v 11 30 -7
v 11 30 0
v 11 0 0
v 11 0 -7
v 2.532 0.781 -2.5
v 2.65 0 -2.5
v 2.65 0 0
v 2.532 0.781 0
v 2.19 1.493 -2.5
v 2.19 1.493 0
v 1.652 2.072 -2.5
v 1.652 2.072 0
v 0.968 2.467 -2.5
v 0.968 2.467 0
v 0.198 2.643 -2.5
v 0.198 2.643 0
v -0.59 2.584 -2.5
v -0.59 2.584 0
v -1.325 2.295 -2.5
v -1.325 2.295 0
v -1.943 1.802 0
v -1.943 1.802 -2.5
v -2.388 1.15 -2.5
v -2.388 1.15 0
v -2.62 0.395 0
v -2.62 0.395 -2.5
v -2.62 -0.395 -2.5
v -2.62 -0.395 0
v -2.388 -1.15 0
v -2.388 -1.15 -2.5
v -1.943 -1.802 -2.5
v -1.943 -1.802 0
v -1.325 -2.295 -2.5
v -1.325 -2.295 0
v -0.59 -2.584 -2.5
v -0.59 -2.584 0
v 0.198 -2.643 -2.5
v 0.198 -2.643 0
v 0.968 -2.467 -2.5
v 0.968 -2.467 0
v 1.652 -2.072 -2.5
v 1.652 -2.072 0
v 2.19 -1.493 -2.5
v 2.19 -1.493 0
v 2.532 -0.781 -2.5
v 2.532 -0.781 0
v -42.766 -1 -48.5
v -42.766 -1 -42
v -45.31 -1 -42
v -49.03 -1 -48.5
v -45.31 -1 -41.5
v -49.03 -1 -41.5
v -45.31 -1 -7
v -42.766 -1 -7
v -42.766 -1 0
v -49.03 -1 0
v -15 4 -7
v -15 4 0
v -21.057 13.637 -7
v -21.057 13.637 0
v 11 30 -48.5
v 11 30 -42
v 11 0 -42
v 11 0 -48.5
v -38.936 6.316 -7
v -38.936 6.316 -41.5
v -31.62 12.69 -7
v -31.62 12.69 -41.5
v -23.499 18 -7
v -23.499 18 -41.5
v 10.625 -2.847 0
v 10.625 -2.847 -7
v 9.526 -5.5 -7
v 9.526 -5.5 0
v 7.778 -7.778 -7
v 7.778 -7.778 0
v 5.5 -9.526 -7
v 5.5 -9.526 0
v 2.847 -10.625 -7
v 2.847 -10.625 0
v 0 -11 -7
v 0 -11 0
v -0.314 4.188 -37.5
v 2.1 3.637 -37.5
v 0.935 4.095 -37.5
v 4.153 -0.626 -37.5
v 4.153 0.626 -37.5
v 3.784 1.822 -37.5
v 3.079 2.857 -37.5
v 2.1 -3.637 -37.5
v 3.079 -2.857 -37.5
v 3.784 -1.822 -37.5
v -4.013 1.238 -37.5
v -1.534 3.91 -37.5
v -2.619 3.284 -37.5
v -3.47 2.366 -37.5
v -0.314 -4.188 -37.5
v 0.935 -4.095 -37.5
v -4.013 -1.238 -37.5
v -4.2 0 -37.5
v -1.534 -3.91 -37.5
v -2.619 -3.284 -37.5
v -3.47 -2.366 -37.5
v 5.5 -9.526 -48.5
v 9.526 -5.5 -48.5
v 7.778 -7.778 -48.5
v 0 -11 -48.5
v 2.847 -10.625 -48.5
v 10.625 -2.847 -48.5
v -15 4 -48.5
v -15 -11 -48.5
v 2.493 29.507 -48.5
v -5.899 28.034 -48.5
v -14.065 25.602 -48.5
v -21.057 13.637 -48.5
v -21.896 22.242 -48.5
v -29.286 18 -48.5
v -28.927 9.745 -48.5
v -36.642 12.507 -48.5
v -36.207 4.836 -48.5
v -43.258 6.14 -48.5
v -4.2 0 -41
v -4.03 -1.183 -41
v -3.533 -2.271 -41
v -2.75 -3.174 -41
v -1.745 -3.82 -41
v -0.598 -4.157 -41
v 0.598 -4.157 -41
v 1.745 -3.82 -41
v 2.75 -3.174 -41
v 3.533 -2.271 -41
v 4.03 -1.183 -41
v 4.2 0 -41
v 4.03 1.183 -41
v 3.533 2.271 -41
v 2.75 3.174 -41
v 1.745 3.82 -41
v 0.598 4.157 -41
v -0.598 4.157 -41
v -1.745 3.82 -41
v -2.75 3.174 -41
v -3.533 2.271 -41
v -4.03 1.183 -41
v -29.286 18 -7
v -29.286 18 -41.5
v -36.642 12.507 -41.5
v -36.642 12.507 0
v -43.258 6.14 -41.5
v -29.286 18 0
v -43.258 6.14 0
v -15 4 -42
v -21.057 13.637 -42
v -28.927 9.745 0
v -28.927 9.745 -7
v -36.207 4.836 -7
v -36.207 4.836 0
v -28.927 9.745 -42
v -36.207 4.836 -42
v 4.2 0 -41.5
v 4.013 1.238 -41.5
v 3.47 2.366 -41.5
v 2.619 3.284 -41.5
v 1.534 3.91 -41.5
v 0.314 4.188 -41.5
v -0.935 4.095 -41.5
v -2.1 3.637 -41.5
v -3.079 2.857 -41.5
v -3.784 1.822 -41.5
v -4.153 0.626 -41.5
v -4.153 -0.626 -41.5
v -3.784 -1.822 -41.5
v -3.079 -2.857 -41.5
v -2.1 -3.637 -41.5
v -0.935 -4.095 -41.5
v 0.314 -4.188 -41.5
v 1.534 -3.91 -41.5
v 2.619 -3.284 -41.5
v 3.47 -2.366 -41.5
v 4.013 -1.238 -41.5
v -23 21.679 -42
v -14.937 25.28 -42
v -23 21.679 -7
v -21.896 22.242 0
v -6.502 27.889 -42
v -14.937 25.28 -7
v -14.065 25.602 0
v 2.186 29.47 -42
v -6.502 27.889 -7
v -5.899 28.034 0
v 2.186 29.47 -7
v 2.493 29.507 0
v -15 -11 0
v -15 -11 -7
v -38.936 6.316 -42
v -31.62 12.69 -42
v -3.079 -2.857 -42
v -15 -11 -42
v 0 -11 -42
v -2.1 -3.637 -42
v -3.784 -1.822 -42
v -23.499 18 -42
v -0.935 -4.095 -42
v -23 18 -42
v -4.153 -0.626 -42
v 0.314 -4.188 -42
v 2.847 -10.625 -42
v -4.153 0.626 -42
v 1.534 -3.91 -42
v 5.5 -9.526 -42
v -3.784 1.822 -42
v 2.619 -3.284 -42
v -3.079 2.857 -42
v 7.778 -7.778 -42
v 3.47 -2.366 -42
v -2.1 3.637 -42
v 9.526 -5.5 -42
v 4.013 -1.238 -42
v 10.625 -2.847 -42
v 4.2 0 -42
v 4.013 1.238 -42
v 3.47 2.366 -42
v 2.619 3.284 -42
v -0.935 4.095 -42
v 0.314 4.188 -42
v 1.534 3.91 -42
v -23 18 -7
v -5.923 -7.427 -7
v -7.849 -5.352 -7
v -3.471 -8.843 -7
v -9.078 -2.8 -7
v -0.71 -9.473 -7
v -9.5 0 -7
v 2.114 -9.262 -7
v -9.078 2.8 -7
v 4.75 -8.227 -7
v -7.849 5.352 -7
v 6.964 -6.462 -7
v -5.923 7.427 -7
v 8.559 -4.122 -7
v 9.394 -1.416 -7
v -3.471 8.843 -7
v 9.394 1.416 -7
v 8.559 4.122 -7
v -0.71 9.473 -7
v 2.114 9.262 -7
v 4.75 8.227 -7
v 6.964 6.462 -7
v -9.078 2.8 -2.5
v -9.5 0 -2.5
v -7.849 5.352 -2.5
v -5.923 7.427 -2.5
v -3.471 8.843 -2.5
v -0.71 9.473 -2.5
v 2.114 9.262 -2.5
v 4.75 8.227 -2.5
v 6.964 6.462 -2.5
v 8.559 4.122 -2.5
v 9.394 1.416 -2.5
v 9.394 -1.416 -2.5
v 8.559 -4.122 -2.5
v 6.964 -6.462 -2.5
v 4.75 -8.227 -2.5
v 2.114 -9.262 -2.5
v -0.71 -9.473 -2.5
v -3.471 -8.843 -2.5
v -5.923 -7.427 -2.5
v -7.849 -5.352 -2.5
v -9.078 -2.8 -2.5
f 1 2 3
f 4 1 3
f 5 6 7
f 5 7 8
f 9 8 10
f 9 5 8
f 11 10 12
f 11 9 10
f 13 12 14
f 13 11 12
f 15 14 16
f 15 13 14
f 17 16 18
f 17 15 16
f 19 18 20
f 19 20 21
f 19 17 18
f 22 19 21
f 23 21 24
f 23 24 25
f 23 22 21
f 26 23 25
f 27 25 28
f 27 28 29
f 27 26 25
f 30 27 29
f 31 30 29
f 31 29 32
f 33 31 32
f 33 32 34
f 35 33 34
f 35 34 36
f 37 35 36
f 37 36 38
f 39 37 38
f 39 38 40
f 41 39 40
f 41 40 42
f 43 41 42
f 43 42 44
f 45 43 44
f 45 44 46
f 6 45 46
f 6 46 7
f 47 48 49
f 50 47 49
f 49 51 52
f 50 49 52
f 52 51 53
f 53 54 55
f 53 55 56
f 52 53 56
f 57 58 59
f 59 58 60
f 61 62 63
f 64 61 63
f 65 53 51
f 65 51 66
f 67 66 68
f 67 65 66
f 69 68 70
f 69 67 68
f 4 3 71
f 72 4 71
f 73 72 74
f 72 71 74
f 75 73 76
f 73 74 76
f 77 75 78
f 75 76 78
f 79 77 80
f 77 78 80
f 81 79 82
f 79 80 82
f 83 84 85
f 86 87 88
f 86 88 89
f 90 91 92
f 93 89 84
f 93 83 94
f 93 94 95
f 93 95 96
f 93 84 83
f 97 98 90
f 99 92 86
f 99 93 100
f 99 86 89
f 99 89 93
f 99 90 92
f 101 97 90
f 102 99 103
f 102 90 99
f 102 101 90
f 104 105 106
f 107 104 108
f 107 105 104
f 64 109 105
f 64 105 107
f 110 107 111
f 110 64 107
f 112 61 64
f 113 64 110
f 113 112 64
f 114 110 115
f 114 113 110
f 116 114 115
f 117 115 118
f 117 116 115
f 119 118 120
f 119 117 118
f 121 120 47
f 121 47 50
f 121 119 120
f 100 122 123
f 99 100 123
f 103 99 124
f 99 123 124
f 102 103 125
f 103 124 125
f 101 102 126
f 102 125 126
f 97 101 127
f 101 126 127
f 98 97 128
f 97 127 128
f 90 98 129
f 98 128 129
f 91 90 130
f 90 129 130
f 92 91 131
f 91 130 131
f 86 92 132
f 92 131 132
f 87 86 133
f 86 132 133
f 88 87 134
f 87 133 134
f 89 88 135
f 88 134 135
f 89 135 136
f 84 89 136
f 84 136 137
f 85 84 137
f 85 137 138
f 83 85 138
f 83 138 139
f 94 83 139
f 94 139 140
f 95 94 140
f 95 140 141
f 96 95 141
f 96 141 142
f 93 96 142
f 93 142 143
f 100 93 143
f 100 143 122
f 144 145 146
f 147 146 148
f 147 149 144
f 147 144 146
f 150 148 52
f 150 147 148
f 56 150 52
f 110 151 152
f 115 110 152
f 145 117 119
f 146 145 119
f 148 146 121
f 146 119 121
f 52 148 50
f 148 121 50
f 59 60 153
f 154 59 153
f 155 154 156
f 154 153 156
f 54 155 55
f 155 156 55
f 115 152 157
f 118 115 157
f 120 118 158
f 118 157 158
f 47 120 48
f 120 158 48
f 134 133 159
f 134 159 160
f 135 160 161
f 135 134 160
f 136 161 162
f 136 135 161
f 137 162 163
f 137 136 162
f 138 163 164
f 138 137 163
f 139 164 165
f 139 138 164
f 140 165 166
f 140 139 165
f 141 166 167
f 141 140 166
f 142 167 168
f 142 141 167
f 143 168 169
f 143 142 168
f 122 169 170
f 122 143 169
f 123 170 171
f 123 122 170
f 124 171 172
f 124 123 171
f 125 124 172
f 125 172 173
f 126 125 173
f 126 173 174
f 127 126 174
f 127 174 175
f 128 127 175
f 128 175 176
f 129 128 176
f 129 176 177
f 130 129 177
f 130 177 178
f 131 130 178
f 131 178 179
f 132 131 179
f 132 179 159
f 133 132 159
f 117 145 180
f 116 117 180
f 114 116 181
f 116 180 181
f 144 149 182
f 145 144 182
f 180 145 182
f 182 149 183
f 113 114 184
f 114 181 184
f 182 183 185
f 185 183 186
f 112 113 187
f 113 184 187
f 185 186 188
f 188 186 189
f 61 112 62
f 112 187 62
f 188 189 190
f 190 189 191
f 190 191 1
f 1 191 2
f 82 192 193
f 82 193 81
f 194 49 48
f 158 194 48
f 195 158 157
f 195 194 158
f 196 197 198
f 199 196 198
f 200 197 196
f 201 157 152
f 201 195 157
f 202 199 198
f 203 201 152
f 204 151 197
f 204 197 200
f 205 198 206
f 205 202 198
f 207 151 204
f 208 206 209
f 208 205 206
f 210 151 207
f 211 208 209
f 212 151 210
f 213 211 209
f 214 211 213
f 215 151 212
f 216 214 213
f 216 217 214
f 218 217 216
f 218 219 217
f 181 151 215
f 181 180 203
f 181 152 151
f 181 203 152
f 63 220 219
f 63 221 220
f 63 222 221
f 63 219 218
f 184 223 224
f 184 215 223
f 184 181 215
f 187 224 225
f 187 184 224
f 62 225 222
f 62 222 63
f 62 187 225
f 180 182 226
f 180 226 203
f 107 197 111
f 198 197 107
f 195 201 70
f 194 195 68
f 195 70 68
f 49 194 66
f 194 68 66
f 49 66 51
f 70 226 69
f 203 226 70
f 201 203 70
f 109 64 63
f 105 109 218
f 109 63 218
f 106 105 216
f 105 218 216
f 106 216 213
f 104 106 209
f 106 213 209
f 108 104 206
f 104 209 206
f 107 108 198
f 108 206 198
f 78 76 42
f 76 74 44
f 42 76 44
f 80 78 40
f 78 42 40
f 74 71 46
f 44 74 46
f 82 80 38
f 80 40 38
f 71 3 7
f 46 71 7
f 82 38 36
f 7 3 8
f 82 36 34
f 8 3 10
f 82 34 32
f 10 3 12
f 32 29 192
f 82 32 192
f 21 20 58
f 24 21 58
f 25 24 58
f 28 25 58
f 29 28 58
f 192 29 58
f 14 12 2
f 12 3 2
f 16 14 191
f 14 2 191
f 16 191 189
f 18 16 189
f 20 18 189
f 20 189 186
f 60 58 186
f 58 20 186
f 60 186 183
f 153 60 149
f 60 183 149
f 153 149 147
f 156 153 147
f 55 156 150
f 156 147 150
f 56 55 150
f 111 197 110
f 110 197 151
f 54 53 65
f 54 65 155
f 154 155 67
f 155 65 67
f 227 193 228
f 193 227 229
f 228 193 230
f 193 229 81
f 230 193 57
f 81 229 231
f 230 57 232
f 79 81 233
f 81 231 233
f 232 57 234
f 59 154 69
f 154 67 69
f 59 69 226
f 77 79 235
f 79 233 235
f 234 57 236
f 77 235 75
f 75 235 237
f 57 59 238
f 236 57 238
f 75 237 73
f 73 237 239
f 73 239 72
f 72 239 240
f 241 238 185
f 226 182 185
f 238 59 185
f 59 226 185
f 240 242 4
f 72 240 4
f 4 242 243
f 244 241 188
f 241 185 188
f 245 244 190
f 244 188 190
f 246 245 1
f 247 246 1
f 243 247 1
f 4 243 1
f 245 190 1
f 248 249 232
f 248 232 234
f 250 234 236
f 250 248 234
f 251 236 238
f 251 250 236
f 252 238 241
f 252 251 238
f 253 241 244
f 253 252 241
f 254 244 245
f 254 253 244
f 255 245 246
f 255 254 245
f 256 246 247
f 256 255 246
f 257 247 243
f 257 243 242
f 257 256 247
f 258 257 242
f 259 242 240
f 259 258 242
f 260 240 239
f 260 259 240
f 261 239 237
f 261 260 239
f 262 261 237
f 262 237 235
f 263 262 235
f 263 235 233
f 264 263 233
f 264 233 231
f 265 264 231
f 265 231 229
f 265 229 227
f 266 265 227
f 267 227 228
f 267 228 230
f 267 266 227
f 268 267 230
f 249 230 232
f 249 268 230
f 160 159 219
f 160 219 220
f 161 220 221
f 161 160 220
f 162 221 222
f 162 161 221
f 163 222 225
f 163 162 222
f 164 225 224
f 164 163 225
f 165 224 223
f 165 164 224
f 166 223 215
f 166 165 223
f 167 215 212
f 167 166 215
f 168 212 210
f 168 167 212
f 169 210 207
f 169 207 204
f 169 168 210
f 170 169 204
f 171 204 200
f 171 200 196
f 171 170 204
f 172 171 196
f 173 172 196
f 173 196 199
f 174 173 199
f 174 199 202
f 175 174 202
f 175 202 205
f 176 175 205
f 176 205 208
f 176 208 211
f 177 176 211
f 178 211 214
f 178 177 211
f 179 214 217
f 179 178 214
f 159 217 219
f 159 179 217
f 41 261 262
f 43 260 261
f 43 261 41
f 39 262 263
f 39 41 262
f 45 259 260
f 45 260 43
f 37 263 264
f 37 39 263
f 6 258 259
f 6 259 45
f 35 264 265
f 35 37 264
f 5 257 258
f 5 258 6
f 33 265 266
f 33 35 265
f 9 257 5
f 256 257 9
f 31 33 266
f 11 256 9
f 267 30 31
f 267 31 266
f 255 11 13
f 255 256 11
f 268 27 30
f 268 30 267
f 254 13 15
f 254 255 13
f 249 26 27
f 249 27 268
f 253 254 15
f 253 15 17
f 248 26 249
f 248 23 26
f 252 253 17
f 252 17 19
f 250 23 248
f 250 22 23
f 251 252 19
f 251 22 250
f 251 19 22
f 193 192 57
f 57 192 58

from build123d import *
from build123d.topology import SkipClean

# Parameters (mm, degrees)
SKETCH1_R                = 9.5
BOSS_EXTRUDE1_DEPTH      = 48
SKETCH2_W                = 34
SKETCH2_H                = 30
CUT_EXTRUDE1_DEPTH       = 62.481704596
BOSS_EXTRUDE2_START      = -2.5
SKETCH3_R                = 9.5
SKETCH3_R_2              = 2.4
BOSS_EXTRUDE2_DEPTH      = 2.5
SKETCH4_R                = 9.5
SKETCH4_R_2              = 4.2
BOSS_EXTRUDE3_DEPTH      = 7
SKETCH5_R                = 4.2
BOSS_EXTRUDE4_DEPTH      = 11
BOSS_EXTRUDE5_DEPTH      = 48
CUT_EXTRUDE2_START       = -48
CUT_EXTRUDE2_OUTLINE_R   = 2.65
CUT_EXTRUDE2_DEPTH       = 48
CUT_EXTRUDE3_START       = -4.5
SKETCH8_R                = 9.5
CUT_EXTRUDE3_DEPTH       = 4.5
SKETCH9_R                = 6.067807638
CUT_EXTRUDE4_DEPTH       = 4.5
SKETCH10_R               = 9.5
BOSS_EXTRUDE6_DEPTH      = 4.5
SKETCH11_R               = 4.2
BOSS_EXTRUDE7_DEPTH      = 3.5
SKETCH12_R               = 2.4
BOSS_EXTRUDE8_DEPTH      = 2.5
SKETCH13_W               = 35
SKETCH13_H               = 34
CUT_EXTRUDE5_DEPTH       = 14.5
SKETCH15_R               = 3.436413098
BOSS_EXTRUDE9_DEPTH      = 10
BOSS_EXTRUDE10_DEPTH     = 0.5
SKETCH18_R               = 4.2
CUT_EXTRUDE8_DEPTH       = 0.5
CUT_EXTRUDE9_DEPTH       = 69.529190861
BOSS_EXTRUDE11_DEPTH     = 7
CUT_EXTRUDE10_DEPTH      = 80.22909819
BOSS_EXTRUDE12_DEPTH     = 41.5
SKETCH25_R               = 4.2
CUT_EXTRUDE11_DEPTH      = 0.5
CUT_EXTRUDE12_DEPTH      = 80.22909819
CUT_EXTRUDE12_DEPTH_BACK = 80.22909819


# Read off the part's stored shape, not the designer's step: Cut-Extrude2
with BuildPart() as part:
    # Sketch1 → Boss-Extrude1 (new body)
    with BuildSketch(Plane.XY):
        with BuildLine():
            Line((-12, 0), (-12, 30))
            Line((-12, 30), (12, 30))
            Line((12, 30), (12, 0))
            ThreePointArc((12, 0), (0, -12), (-12, 0))
        make_face()
        Circle(SKETCH1_R, mode=Mode.SUBTRACT)
    extrude(amount=-BOSS_EXTRUDE1_DEPTH)

    # Sketch2 → Cut-Extrude1 (cut, through all)
    with BuildSketch(Plane.ZY.offset(12)):
        with Locations((-24, 3)):
            Rectangle(SKETCH2_W, SKETCH2_H)
    extrude(amount=-CUT_EXTRUDE1_DEPTH, mode=Mode.SUBTRACT)

    # Sketch3 → Boss-Extrude2 (add)
    with BuildSketch(Plane(origin=(0, 0, -48), x_dir=(-1, 0, 0), z_dir=(0, 0, -1)).offset(BOSS_EXTRUDE2_START)):
        Circle(SKETCH3_R)
        Circle(SKETCH3_R_2, mode=Mode.SUBTRACT)
    extrude(amount=BOSS_EXTRUDE2_DEPTH)

    # Sketch4 → Boss-Extrude3 (add)
    with BuildSketch(Plane.XY):
        with Locations(Location((0, 0, 0), (0, 0, 180))):
            Circle(SKETCH4_R)
        Circle(SKETCH4_R_2, mode=Mode.SUBTRACT)
    extrude(amount=-BOSS_EXTRUDE3_DEPTH)

    # Sketch5 → Boss-Extrude4 (add)
    with BuildSketch(Plane.XY):
        Circle(SKETCH5_R)
    extrude(amount=-BOSS_EXTRUDE4_DEPTH)

    # Sketch6 → Boss-Extrude5 (add)
    with BuildSketch(Plane(origin=(0, 0, -48), x_dir=(-1, 0, 0), z_dir=(0, 0, -1))):
        Polygon((12, 30), (12, 18), (18, 18), (38, 18), (38, 30), align=None)
    extrude(amount=-BOSS_EXTRUDE5_DEPTH)

    # Cut-Extrude2 outline → Cut-Extrude2 (cut)
    with BuildSketch(Plane.XY.offset(CUT_EXTRUDE2_START)):
        Circle(CUT_EXTRUDE2_OUTLINE_R)
    extrude(amount=CUT_EXTRUDE2_DEPTH, mode=Mode.SUBTRACT)

    # Sketch8 → Cut-Extrude3 (cut)
    with BuildSketch(Plane(origin=(0, 0, -7), x_dir=(-1, 0, 0), z_dir=(0, 0, -1)).offset(CUT_EXTRUDE3_START)):
        Circle(SKETCH8_R)
    extrude(amount=CUT_EXTRUDE3_DEPTH, mode=Mode.SUBTRACT)


with BuildPart() as cut_extrude3_piece_1:
    # of the separate pieces the step leaves, piece 1, a body of its own (cut_extrude3_pieces)
    add(part.part.solids().sort_by_distance((-12, 0, 0))[0])

    # Sketch10 → Boss-Extrude6 (add)
    with BuildSketch(Plane.XY.offset(-45.5)):
        with Locations(Location((0, 0, 0), (0, 0, 90))):
            Circle(SKETCH10_R)
    extrude(amount=BOSS_EXTRUDE6_DEPTH)

    # Sketch11 → Boss-Extrude7 (add)
    with BuildSketch(Plane.XY.offset(-41)):
        with Locations(Location((0, 0, 0), (0, 0, 180))):
            Circle(SKETCH11_R)
    extrude(amount=BOSS_EXTRUDE7_DEPTH)

    # Sketch12 → Boss-Extrude8 (add)
    with BuildSketch(Plane(origin=(0, 0, -48), x_dir=(-1, 0, 0), z_dir=(0, 0, -1))):
        Circle(SKETCH12_R)
    extrude(amount=-BOSS_EXTRUDE8_DEPTH)

    # Sketch13 → Cut-Extrude5 (cut)
    with BuildSketch(Plane(origin=(0, 30, 0), x_dir=(1, 0, 0), z_dir=(0, 1, 0))):
        with Locations((-5.5, 24)):
            Rectangle(SKETCH13_W, SKETCH13_H)
    extrude(amount=-CUT_EXTRUDE5_DEPTH, mode=Mode.SUBTRACT)

    # Sketch15 → Boss-Extrude9 (add)
    with BuildSketch(Plane(origin=(0, 0, -48), x_dir=(-1, 0, 0), z_dir=(0, 0, -1))):
        Circle(SKETCH15_R)
    extrude(amount=-BOSS_EXTRUDE9_DEPTH)

    # Sketch16 → Boss-Extrude10 (add)
    with SkipClean():  # the faces are left unmerged after this step: merging them gives an invalid solid
        with BuildSketch(Plane(origin=(0, 0, -48), x_dir=(-1, 0, 0), z_dir=(0, 0, -1))):
            Polygon((38, 30), (-12, 30), (-12, 18), (12, 18), (38, 18), align=None)
            with BuildLine():
                Line((-12, 0), (12, 0))
                ThreePointArc((12, 0), (0, -12), (-12, 0))
            make_face()
            with BuildLine():
                ThreePointArc((12, 0), (0, 12), (-12, 0))
                Line((-12, 0), (12, 0))
            make_face()
            with BuildLine():
                Line((12, 0), (-12, 0))
                ThreePointArc((-12, 0), (0, -12), (12, 0))
            make_face()
            with BuildLine():
                Line((12, 18), (-12, 18))
                Line((-12, 18), (-12, 0))
                ThreePointArc((-12, 0), (0, 12), (12, 0))
                Line((12, 0), (12, 18))
            make_face()
        extrude(amount=BOSS_EXTRUDE10_DEPTH)

    # Sketch18 → Cut-Extrude8 (cut)
    with SkipClean():  # the faces are left unmerged after this step: merging them gives an invalid solid
        with BuildSketch(Plane.XY.offset(-41)):
            with BuildLine():
                Line((12, 30), (-23, 30))
                Line((-23, 30), (-23, 18))
                Line((-23, 18), (-12, 18))
                Line((-12, 18), (-12, 0))
                ThreePointArc((-12, 0), (0, -12), (12, 0))
                Line((12, 0), (12, 30))
            make_face()
            Circle(SKETCH18_R, mode=Mode.SUBTRACT)
        extrude(amount=-CUT_EXTRUDE8_DEPTH, mode=Mode.SUBTRACT)

    # Sketch19 → Cut-Extrude9 (cut, through all)
    with SkipClean():  # the faces are left unmerged after this step: merging them gives an invalid solid
        with BuildSketch(Plane.XY):
            with BuildLine():
                ThreePointArc((11, 0), (0, -11), (-11, 0))
                Line((-11, 0), (-12, 0))
                ThreePointArc((-12, 0), (0, -12), (12, 0))
                Line((12, 0), (12, 30))
                Line((12, 30), (11, 30))
                Line((11, 30), (11, 0))
            make_face()
        extrude(amount=-CUT_EXTRUDE9_DEPTH, mode=Mode.SUBTRACT)

    # Sketch21 → Boss-Extrude11 (add)
    with SkipClean():  # the faces are left unmerged after this step: merging them gives an invalid solid
        with BuildSketch(Plane.XY):
            with BuildLine():
                Line((-55, -11), (0, -11))
                ThreePointArc((0, -11), (-7.778174593, -7.778174593), (-11, 0))
                Line((-11, 0), (-12, 0))
                Line((-12, 0), (-12, 18))
                Line((-12, 18), (-29.285566016, 18))
                ThreePointArc((-29.285566016, 18), (-44.085437149, 5.222560402), (-55, -11))
            make_face()
        boss_extrude11 = extrude(amount=-BOSS_EXTRUDE11_DEPTH)

    # Mirror2: Boss-Extrude11 across plane
    with SkipClean():  # the faces are left unmerged after this step: merging them gives an invalid solid
        add(boss_extrude11.mirror(Plane.XY.offset(-24.25)))

    # Sketch23 → Cut-Extrude10 (cut, through all)
    with SkipClean():  # the faces are left unmerged after this step: merging them gives an invalid solid
        with BuildSketch(Plane.XY):
            with BuildLine():
                Line((11, 30), (-38, 30))
                Line((-38, 30), (-38, 11.325220695))
                ThreePointArc((-38, 11.325220695), (-15.219016868, 25.173069355), (11, 30))
            make_face()
        extrude(amount=-CUT_EXTRUDE10_DEPTH, mode=Mode.SUBTRACT)

    # Sketch24 → Boss-Extrude12 (add)
    with SkipClean():  # the faces are left unmerged after this step: merging them gives an invalid solid
        with BuildSketch(Plane.XY):
            with BuildLine():
                ThreePointArc((-23, 21.6788275), (-41.60205739, 7.887419381), (-55, -11))
                Line((-55, -11), (-51.635998377, -11))
                ThreePointArc((-51.635998377, -11), (-39.486754135, 5.75970176), (-23, 18.276837089))
                Line((-23, 18.276837089), (-23, 21.6788275))
            make_face()
        extrude(amount=-BOSS_EXTRUDE12_DEPTH)

    # Sketch25 → Cut-Extrude11 (cut)
    # profile 1 of 3: a face of its own
    with BuildSketch(Plane.XY.offset(-41.5)):
        with BuildLine():
            ThreePointArc((11, 27), (-6.550595226, 24.784456384), (-23, 18.276837089))
            Line((-23, 18.276837089), (-23, 18))
            Line((-23, 18), (-23.499204657, 18))
            ThreePointArc((-23.499204657, 18), (-39.685914386, 5.555259732), (-51.635998377, -11))
            Line((-51.635998377, -11), (0, -11))
            ThreePointArc((0, -11), (-7.778174593, 7.778174593), (11, 0))
            Line((11, 0), (11, 27))
        make_face()
    # profile 2 of 3: a face of its own
    with BuildSketch(Plane.XY.offset(-41.5)):
        with BuildLine():
            ThreePointArc((0, -11), (7.778174593, -7.778174593), (11, 0))
            ThreePointArc((11, 0), (-7.778174593, 7.778174593), (0, -11))
        make_face()
        Circle(SKETCH25_R, mode=Mode.SUBTRACT)
    # profile 3 of 3: a face of its own
    with BuildSketch(Plane.XY.offset(-41.5)):
        with BuildLine():
            ThreePointArc((11, 30), (-6.501727856, 27.889455027), (-23, 21.6788275))
            Line((-23, 21.6788275), (-23, 18.276837089))
            ThreePointArc((-23, 18.276837089), (-6.550595226, 24.784456384), (11, 27))
            Line((11, 27), (11, 30))
        make_face()
    extrude(amount=-CUT_EXTRUDE11_DEPTH, mode=Mode.SUBTRACT)

    # Sketch26 → Cut-Extrude12 (cut, two sides: drawn at the far end of the back side and taken through both)
    with BuildSketch(Plane(origin=(0, 0, -48.5), x_dir=(-1, 0, 0), z_dir=(0, 0, -1)).offset(-CUT_EXTRUDE12_DEPTH_BACK)):
        with BuildLine():
            Line((15, -11), (15, 4))
            Line((15, 4), (21.056677648, 13.637195648))
            ThreePointArc((21.056677648, 13.637195648), (32.64899906, 7.412367977), (42.766432542, -1))
            Line((42.766432542, -1), (55, -1))
            Line((55, -1), (55, -11))
            Line((55, -11), (15, -11))
        make_face()
    extrude(amount=CUT_EXTRUDE12_DEPTH + CUT_EXTRUDE12_DEPTH_BACK, mode=Mode.SUBTRACT)


with BuildPart() as cut_extrude3_piece_2:
    # of the separate pieces the step leaves, piece 2, a body of its own (cut_extrude3_pieces)
    add(part.part.solids().sort_by_distance((4.2, 0, -7))[0])

    # Sketch9 → Cut-Extrude4 (cut)
    with BuildSketch(Plane(origin=(0, 0, -11), x_dir=(-1, 0, 0), z_dir=(0, 0, -1))):
        Circle(SKETCH9_R)
    extrude(amount=-CUT_EXTRUDE4_DEPTH, mode=Mode.SUBTRACT)


solid = cut_extrude3_piece_1.part
